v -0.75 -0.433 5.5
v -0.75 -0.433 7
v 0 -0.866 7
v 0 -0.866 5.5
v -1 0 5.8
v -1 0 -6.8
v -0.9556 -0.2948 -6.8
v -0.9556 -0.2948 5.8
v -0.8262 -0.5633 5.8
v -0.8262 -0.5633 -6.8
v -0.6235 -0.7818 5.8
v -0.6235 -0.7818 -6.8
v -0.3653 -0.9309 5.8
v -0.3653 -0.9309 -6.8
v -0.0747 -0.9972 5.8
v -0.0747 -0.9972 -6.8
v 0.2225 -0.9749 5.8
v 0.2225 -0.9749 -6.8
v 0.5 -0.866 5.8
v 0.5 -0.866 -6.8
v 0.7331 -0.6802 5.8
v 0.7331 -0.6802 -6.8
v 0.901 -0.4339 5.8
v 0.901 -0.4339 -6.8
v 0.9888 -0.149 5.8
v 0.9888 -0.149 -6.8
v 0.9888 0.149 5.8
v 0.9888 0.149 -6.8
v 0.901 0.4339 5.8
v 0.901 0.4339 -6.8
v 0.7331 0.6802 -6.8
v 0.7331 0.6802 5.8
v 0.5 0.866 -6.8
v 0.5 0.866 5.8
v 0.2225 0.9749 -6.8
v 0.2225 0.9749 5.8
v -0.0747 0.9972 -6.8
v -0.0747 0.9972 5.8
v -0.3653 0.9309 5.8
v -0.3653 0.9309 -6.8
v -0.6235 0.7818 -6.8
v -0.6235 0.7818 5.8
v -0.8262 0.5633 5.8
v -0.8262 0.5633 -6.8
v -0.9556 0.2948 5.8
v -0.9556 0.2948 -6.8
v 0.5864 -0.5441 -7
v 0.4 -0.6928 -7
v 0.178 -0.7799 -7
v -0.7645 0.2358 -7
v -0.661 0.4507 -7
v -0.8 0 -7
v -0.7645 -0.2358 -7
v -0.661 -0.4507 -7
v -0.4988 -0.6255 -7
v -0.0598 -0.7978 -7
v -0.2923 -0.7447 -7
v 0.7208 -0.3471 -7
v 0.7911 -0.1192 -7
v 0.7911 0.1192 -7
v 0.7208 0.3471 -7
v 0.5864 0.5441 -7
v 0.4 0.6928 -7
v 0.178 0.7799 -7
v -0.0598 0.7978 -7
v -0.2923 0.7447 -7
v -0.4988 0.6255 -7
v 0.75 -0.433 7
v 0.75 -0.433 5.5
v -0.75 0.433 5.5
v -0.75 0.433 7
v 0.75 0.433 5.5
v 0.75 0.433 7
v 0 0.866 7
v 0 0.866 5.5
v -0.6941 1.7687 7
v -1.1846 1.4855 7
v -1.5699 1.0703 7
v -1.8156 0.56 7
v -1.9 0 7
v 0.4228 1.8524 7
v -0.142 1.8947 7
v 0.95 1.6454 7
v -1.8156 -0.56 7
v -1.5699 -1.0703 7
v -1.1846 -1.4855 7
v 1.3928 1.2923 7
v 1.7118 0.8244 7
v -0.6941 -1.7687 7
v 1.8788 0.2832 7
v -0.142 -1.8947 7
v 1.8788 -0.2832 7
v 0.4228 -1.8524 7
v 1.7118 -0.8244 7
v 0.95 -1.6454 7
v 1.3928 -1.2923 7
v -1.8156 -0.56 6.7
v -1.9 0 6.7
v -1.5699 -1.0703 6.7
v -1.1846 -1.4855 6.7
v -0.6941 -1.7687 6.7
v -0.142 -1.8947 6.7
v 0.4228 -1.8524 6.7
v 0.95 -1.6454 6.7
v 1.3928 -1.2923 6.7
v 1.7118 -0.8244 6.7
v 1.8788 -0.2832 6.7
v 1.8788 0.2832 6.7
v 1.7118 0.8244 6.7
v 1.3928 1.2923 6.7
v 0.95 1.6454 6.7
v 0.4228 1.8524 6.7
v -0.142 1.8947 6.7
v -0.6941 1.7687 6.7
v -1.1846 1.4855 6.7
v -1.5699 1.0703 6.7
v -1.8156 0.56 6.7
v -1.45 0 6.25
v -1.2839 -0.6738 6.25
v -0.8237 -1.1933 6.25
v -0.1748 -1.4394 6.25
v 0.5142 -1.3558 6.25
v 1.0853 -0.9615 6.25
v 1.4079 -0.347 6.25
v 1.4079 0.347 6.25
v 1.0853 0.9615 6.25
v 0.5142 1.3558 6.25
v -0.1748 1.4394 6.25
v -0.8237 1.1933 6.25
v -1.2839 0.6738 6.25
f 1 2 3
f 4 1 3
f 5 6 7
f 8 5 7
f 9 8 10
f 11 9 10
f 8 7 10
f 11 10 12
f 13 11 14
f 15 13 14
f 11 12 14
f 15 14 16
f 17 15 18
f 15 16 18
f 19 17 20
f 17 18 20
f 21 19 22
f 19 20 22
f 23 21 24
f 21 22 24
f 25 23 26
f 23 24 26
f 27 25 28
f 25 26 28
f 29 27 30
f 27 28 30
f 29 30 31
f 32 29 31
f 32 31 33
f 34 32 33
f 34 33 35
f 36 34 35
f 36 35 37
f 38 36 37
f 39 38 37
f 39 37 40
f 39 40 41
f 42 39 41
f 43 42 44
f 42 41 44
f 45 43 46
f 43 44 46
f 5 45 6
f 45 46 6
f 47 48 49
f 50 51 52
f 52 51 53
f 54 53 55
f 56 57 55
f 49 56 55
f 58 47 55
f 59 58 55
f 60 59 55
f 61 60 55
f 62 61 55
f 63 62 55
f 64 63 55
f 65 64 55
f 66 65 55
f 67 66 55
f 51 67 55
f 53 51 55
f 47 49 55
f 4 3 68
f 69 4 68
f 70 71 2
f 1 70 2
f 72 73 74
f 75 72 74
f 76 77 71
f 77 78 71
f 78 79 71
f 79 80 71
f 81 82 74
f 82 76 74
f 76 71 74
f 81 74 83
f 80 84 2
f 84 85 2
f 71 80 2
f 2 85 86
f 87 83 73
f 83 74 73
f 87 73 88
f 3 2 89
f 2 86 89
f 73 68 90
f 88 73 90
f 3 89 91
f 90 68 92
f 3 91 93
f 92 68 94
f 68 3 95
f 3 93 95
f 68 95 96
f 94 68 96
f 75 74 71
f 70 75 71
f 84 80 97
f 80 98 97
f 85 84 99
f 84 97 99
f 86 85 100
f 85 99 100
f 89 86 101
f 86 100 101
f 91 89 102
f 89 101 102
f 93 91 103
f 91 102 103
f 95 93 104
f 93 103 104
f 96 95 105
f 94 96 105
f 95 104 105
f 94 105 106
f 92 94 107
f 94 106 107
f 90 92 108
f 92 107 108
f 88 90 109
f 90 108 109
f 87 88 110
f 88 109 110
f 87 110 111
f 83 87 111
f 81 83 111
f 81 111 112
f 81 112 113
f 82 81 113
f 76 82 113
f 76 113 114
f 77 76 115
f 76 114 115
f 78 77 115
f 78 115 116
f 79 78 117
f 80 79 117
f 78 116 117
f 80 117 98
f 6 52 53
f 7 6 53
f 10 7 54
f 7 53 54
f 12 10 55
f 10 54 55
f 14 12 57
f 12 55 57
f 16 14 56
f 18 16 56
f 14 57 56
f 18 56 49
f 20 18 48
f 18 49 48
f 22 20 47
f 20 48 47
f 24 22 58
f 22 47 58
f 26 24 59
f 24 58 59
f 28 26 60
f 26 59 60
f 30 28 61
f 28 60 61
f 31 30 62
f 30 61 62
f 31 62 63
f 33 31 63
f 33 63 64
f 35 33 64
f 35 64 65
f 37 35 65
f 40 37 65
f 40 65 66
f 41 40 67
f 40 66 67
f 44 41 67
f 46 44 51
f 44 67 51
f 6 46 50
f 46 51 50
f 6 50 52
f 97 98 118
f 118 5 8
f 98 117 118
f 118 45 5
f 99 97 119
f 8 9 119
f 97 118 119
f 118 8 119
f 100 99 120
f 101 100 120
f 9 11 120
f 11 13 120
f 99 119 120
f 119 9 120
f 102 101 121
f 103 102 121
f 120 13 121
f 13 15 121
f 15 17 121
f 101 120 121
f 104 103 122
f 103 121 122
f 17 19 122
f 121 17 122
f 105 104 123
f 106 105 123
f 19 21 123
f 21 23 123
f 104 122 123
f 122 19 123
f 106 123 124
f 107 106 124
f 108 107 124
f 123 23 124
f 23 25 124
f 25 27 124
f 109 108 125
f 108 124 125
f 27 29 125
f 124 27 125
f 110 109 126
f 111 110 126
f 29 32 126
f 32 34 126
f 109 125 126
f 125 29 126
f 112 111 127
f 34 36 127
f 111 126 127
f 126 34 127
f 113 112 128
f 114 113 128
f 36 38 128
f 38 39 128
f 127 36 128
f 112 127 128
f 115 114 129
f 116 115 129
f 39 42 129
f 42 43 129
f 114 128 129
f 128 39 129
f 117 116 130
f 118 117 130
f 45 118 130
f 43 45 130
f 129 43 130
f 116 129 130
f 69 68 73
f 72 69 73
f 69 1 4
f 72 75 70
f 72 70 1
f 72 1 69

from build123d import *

# Parameters (mm, degrees)
CUT_EXTRUDE_1_DEPTH = 1.5
CHAMFER_1_SIZE      = 0.2


with BuildPart() as part:
    # 草图1 → 旋转1 (revolve)
    with BuildSketch(Plane(origin=(0, 0, 0), x_dir=(0, 0, -1), z_dir=(1, 0, 0)), mode=Mode.PRIVATE) as revolve_1_sk:
        Polygon((7, 0), (-7, 0), (-7, 1.9), (-6.7, 1.9), (-5.8, 1), (7, 1), align=None)
    revolve(revolve_1_sk.sketch.rotate(Axis((0, 0, -7), (0, 0, 1)), 90), axis=Axis((0, 0, -7), (0, 0, 1)))

    # 草图2 → 切除-拉伸1 (cut)
    with BuildSketch(Plane.XY.offset(7)):
        Polygon((0, 0.866025404), (-0.75, 0.433012702), (-0.75, -0.433012702), (0, -0.866025404), (0.75, -0.433012702), (0.75, 0.433012702), align=None)
    extrude(amount=-CUT_EXTRUDE_1_DEPTH, mode=Mode.SUBTRACT)

    # 倒角1
    chamfer_1_edges = [part.edges().sort_by_distance(p)[0] for p in [
        (1, 0, -7),
    ]]
    chamfer(chamfer_1_edges, length=CHAMFER_1_SIZE)


solid = part.part
